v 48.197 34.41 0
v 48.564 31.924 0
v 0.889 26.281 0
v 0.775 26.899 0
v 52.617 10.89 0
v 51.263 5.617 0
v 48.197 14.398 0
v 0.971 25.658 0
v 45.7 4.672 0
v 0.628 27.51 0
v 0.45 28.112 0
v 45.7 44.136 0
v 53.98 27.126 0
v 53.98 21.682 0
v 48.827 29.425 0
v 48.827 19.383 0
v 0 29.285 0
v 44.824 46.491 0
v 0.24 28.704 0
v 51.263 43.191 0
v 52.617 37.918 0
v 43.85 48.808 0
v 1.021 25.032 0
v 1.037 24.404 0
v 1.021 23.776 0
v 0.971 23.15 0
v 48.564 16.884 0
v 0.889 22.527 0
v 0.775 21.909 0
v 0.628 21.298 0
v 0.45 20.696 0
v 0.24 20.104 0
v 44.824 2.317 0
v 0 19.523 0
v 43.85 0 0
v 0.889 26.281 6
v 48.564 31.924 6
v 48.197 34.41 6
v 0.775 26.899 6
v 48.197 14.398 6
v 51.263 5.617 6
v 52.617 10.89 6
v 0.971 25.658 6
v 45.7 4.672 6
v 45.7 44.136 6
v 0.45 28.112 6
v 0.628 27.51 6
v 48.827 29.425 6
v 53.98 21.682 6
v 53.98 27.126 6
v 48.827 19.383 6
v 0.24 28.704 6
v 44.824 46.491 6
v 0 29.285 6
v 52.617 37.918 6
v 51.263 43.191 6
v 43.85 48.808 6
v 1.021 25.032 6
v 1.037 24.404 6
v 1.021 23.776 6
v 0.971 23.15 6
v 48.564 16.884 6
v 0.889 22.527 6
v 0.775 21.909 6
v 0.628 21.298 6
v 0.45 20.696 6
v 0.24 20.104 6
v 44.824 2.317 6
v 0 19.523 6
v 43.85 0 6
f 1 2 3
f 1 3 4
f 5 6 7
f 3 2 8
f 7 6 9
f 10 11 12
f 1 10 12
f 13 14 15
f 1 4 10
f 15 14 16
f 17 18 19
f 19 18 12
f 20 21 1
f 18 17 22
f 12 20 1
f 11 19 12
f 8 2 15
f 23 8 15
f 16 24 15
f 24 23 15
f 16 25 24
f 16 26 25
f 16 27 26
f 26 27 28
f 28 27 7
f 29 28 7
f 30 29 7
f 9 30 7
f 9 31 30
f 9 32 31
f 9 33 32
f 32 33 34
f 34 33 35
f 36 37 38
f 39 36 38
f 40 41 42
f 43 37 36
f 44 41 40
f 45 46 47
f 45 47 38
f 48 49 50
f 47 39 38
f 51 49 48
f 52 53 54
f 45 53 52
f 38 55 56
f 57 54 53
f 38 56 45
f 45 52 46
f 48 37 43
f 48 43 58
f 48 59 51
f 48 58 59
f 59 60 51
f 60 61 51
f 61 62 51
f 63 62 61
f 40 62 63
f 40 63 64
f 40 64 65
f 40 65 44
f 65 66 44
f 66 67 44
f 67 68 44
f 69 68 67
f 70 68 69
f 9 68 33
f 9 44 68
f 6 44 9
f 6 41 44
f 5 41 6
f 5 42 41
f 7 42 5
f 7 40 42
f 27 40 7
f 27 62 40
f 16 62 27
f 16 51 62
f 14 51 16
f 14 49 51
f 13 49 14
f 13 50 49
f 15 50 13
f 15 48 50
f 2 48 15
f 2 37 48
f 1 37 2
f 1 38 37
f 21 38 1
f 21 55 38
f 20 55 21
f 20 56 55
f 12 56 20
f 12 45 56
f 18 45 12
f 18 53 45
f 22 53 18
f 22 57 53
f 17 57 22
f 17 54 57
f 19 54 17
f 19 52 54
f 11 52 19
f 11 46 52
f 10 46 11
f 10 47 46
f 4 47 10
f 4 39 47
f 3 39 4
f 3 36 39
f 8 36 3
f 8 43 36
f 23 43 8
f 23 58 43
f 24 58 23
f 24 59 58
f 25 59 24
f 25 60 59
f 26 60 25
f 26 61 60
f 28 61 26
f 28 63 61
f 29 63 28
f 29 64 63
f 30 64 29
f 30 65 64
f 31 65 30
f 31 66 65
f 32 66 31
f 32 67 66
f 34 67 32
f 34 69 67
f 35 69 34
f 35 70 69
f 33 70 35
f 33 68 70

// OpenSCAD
$fn = 32;

// ----------------------------------------------------------------------
// Gear sector: 3 teeth on 48 degrees
// ----------------------------------------------------------------------

// --- parameters (mm) ---
sector_angle = 48;        // sector angle, degrees
root_r = 60;              // root circle radius
tooth_h = 5;              // tooth height over the root circle
teeth = 3;                // number of teeth on the sector
hub_r = 12;               // hub bore radius
plate_t = 6;              // sector thickness, Z
arc_step = 3;             // sampling step of the root/hub arcs, degrees

tip_r = root_r + tooth_h;  // tip circle radius

profile = [[43.85, 0], [44.824, 2.317], [45.7, 4.672], [51.263, 5.617], [52.617, 10.89], [48.197, 14.398], [48.564, 16.884], [48.827, 19.383], [53.98, 21.682], [53.98, 27.126], [48.827, 29.425], [48.564, 31.924], [48.197, 34.41], [52.617, 37.918], [51.263, 43.191], [45.7, 44.136], [44.824, 46.491], [43.85, 48.808], [0, 29.285], [0.24, 28.704], [0.45, 28.112], [0.628, 27.51], [0.775, 26.899], [0.889, 26.281], [0.971, 25.658], [1.021, 25.032], [1.037, 24.404], [1.021, 23.776], [0.971, 23.15], [0.889, 22.527], [0.775, 21.909], [0.628, 21.298], [0.45, 20.696], [0.24, 20.104], [0, 19.523]];  // primary outline, 35 points, counter clockwise

// --- the one profile operation ---
linear_extrude(height = plate_t) polygon(points = profile);
